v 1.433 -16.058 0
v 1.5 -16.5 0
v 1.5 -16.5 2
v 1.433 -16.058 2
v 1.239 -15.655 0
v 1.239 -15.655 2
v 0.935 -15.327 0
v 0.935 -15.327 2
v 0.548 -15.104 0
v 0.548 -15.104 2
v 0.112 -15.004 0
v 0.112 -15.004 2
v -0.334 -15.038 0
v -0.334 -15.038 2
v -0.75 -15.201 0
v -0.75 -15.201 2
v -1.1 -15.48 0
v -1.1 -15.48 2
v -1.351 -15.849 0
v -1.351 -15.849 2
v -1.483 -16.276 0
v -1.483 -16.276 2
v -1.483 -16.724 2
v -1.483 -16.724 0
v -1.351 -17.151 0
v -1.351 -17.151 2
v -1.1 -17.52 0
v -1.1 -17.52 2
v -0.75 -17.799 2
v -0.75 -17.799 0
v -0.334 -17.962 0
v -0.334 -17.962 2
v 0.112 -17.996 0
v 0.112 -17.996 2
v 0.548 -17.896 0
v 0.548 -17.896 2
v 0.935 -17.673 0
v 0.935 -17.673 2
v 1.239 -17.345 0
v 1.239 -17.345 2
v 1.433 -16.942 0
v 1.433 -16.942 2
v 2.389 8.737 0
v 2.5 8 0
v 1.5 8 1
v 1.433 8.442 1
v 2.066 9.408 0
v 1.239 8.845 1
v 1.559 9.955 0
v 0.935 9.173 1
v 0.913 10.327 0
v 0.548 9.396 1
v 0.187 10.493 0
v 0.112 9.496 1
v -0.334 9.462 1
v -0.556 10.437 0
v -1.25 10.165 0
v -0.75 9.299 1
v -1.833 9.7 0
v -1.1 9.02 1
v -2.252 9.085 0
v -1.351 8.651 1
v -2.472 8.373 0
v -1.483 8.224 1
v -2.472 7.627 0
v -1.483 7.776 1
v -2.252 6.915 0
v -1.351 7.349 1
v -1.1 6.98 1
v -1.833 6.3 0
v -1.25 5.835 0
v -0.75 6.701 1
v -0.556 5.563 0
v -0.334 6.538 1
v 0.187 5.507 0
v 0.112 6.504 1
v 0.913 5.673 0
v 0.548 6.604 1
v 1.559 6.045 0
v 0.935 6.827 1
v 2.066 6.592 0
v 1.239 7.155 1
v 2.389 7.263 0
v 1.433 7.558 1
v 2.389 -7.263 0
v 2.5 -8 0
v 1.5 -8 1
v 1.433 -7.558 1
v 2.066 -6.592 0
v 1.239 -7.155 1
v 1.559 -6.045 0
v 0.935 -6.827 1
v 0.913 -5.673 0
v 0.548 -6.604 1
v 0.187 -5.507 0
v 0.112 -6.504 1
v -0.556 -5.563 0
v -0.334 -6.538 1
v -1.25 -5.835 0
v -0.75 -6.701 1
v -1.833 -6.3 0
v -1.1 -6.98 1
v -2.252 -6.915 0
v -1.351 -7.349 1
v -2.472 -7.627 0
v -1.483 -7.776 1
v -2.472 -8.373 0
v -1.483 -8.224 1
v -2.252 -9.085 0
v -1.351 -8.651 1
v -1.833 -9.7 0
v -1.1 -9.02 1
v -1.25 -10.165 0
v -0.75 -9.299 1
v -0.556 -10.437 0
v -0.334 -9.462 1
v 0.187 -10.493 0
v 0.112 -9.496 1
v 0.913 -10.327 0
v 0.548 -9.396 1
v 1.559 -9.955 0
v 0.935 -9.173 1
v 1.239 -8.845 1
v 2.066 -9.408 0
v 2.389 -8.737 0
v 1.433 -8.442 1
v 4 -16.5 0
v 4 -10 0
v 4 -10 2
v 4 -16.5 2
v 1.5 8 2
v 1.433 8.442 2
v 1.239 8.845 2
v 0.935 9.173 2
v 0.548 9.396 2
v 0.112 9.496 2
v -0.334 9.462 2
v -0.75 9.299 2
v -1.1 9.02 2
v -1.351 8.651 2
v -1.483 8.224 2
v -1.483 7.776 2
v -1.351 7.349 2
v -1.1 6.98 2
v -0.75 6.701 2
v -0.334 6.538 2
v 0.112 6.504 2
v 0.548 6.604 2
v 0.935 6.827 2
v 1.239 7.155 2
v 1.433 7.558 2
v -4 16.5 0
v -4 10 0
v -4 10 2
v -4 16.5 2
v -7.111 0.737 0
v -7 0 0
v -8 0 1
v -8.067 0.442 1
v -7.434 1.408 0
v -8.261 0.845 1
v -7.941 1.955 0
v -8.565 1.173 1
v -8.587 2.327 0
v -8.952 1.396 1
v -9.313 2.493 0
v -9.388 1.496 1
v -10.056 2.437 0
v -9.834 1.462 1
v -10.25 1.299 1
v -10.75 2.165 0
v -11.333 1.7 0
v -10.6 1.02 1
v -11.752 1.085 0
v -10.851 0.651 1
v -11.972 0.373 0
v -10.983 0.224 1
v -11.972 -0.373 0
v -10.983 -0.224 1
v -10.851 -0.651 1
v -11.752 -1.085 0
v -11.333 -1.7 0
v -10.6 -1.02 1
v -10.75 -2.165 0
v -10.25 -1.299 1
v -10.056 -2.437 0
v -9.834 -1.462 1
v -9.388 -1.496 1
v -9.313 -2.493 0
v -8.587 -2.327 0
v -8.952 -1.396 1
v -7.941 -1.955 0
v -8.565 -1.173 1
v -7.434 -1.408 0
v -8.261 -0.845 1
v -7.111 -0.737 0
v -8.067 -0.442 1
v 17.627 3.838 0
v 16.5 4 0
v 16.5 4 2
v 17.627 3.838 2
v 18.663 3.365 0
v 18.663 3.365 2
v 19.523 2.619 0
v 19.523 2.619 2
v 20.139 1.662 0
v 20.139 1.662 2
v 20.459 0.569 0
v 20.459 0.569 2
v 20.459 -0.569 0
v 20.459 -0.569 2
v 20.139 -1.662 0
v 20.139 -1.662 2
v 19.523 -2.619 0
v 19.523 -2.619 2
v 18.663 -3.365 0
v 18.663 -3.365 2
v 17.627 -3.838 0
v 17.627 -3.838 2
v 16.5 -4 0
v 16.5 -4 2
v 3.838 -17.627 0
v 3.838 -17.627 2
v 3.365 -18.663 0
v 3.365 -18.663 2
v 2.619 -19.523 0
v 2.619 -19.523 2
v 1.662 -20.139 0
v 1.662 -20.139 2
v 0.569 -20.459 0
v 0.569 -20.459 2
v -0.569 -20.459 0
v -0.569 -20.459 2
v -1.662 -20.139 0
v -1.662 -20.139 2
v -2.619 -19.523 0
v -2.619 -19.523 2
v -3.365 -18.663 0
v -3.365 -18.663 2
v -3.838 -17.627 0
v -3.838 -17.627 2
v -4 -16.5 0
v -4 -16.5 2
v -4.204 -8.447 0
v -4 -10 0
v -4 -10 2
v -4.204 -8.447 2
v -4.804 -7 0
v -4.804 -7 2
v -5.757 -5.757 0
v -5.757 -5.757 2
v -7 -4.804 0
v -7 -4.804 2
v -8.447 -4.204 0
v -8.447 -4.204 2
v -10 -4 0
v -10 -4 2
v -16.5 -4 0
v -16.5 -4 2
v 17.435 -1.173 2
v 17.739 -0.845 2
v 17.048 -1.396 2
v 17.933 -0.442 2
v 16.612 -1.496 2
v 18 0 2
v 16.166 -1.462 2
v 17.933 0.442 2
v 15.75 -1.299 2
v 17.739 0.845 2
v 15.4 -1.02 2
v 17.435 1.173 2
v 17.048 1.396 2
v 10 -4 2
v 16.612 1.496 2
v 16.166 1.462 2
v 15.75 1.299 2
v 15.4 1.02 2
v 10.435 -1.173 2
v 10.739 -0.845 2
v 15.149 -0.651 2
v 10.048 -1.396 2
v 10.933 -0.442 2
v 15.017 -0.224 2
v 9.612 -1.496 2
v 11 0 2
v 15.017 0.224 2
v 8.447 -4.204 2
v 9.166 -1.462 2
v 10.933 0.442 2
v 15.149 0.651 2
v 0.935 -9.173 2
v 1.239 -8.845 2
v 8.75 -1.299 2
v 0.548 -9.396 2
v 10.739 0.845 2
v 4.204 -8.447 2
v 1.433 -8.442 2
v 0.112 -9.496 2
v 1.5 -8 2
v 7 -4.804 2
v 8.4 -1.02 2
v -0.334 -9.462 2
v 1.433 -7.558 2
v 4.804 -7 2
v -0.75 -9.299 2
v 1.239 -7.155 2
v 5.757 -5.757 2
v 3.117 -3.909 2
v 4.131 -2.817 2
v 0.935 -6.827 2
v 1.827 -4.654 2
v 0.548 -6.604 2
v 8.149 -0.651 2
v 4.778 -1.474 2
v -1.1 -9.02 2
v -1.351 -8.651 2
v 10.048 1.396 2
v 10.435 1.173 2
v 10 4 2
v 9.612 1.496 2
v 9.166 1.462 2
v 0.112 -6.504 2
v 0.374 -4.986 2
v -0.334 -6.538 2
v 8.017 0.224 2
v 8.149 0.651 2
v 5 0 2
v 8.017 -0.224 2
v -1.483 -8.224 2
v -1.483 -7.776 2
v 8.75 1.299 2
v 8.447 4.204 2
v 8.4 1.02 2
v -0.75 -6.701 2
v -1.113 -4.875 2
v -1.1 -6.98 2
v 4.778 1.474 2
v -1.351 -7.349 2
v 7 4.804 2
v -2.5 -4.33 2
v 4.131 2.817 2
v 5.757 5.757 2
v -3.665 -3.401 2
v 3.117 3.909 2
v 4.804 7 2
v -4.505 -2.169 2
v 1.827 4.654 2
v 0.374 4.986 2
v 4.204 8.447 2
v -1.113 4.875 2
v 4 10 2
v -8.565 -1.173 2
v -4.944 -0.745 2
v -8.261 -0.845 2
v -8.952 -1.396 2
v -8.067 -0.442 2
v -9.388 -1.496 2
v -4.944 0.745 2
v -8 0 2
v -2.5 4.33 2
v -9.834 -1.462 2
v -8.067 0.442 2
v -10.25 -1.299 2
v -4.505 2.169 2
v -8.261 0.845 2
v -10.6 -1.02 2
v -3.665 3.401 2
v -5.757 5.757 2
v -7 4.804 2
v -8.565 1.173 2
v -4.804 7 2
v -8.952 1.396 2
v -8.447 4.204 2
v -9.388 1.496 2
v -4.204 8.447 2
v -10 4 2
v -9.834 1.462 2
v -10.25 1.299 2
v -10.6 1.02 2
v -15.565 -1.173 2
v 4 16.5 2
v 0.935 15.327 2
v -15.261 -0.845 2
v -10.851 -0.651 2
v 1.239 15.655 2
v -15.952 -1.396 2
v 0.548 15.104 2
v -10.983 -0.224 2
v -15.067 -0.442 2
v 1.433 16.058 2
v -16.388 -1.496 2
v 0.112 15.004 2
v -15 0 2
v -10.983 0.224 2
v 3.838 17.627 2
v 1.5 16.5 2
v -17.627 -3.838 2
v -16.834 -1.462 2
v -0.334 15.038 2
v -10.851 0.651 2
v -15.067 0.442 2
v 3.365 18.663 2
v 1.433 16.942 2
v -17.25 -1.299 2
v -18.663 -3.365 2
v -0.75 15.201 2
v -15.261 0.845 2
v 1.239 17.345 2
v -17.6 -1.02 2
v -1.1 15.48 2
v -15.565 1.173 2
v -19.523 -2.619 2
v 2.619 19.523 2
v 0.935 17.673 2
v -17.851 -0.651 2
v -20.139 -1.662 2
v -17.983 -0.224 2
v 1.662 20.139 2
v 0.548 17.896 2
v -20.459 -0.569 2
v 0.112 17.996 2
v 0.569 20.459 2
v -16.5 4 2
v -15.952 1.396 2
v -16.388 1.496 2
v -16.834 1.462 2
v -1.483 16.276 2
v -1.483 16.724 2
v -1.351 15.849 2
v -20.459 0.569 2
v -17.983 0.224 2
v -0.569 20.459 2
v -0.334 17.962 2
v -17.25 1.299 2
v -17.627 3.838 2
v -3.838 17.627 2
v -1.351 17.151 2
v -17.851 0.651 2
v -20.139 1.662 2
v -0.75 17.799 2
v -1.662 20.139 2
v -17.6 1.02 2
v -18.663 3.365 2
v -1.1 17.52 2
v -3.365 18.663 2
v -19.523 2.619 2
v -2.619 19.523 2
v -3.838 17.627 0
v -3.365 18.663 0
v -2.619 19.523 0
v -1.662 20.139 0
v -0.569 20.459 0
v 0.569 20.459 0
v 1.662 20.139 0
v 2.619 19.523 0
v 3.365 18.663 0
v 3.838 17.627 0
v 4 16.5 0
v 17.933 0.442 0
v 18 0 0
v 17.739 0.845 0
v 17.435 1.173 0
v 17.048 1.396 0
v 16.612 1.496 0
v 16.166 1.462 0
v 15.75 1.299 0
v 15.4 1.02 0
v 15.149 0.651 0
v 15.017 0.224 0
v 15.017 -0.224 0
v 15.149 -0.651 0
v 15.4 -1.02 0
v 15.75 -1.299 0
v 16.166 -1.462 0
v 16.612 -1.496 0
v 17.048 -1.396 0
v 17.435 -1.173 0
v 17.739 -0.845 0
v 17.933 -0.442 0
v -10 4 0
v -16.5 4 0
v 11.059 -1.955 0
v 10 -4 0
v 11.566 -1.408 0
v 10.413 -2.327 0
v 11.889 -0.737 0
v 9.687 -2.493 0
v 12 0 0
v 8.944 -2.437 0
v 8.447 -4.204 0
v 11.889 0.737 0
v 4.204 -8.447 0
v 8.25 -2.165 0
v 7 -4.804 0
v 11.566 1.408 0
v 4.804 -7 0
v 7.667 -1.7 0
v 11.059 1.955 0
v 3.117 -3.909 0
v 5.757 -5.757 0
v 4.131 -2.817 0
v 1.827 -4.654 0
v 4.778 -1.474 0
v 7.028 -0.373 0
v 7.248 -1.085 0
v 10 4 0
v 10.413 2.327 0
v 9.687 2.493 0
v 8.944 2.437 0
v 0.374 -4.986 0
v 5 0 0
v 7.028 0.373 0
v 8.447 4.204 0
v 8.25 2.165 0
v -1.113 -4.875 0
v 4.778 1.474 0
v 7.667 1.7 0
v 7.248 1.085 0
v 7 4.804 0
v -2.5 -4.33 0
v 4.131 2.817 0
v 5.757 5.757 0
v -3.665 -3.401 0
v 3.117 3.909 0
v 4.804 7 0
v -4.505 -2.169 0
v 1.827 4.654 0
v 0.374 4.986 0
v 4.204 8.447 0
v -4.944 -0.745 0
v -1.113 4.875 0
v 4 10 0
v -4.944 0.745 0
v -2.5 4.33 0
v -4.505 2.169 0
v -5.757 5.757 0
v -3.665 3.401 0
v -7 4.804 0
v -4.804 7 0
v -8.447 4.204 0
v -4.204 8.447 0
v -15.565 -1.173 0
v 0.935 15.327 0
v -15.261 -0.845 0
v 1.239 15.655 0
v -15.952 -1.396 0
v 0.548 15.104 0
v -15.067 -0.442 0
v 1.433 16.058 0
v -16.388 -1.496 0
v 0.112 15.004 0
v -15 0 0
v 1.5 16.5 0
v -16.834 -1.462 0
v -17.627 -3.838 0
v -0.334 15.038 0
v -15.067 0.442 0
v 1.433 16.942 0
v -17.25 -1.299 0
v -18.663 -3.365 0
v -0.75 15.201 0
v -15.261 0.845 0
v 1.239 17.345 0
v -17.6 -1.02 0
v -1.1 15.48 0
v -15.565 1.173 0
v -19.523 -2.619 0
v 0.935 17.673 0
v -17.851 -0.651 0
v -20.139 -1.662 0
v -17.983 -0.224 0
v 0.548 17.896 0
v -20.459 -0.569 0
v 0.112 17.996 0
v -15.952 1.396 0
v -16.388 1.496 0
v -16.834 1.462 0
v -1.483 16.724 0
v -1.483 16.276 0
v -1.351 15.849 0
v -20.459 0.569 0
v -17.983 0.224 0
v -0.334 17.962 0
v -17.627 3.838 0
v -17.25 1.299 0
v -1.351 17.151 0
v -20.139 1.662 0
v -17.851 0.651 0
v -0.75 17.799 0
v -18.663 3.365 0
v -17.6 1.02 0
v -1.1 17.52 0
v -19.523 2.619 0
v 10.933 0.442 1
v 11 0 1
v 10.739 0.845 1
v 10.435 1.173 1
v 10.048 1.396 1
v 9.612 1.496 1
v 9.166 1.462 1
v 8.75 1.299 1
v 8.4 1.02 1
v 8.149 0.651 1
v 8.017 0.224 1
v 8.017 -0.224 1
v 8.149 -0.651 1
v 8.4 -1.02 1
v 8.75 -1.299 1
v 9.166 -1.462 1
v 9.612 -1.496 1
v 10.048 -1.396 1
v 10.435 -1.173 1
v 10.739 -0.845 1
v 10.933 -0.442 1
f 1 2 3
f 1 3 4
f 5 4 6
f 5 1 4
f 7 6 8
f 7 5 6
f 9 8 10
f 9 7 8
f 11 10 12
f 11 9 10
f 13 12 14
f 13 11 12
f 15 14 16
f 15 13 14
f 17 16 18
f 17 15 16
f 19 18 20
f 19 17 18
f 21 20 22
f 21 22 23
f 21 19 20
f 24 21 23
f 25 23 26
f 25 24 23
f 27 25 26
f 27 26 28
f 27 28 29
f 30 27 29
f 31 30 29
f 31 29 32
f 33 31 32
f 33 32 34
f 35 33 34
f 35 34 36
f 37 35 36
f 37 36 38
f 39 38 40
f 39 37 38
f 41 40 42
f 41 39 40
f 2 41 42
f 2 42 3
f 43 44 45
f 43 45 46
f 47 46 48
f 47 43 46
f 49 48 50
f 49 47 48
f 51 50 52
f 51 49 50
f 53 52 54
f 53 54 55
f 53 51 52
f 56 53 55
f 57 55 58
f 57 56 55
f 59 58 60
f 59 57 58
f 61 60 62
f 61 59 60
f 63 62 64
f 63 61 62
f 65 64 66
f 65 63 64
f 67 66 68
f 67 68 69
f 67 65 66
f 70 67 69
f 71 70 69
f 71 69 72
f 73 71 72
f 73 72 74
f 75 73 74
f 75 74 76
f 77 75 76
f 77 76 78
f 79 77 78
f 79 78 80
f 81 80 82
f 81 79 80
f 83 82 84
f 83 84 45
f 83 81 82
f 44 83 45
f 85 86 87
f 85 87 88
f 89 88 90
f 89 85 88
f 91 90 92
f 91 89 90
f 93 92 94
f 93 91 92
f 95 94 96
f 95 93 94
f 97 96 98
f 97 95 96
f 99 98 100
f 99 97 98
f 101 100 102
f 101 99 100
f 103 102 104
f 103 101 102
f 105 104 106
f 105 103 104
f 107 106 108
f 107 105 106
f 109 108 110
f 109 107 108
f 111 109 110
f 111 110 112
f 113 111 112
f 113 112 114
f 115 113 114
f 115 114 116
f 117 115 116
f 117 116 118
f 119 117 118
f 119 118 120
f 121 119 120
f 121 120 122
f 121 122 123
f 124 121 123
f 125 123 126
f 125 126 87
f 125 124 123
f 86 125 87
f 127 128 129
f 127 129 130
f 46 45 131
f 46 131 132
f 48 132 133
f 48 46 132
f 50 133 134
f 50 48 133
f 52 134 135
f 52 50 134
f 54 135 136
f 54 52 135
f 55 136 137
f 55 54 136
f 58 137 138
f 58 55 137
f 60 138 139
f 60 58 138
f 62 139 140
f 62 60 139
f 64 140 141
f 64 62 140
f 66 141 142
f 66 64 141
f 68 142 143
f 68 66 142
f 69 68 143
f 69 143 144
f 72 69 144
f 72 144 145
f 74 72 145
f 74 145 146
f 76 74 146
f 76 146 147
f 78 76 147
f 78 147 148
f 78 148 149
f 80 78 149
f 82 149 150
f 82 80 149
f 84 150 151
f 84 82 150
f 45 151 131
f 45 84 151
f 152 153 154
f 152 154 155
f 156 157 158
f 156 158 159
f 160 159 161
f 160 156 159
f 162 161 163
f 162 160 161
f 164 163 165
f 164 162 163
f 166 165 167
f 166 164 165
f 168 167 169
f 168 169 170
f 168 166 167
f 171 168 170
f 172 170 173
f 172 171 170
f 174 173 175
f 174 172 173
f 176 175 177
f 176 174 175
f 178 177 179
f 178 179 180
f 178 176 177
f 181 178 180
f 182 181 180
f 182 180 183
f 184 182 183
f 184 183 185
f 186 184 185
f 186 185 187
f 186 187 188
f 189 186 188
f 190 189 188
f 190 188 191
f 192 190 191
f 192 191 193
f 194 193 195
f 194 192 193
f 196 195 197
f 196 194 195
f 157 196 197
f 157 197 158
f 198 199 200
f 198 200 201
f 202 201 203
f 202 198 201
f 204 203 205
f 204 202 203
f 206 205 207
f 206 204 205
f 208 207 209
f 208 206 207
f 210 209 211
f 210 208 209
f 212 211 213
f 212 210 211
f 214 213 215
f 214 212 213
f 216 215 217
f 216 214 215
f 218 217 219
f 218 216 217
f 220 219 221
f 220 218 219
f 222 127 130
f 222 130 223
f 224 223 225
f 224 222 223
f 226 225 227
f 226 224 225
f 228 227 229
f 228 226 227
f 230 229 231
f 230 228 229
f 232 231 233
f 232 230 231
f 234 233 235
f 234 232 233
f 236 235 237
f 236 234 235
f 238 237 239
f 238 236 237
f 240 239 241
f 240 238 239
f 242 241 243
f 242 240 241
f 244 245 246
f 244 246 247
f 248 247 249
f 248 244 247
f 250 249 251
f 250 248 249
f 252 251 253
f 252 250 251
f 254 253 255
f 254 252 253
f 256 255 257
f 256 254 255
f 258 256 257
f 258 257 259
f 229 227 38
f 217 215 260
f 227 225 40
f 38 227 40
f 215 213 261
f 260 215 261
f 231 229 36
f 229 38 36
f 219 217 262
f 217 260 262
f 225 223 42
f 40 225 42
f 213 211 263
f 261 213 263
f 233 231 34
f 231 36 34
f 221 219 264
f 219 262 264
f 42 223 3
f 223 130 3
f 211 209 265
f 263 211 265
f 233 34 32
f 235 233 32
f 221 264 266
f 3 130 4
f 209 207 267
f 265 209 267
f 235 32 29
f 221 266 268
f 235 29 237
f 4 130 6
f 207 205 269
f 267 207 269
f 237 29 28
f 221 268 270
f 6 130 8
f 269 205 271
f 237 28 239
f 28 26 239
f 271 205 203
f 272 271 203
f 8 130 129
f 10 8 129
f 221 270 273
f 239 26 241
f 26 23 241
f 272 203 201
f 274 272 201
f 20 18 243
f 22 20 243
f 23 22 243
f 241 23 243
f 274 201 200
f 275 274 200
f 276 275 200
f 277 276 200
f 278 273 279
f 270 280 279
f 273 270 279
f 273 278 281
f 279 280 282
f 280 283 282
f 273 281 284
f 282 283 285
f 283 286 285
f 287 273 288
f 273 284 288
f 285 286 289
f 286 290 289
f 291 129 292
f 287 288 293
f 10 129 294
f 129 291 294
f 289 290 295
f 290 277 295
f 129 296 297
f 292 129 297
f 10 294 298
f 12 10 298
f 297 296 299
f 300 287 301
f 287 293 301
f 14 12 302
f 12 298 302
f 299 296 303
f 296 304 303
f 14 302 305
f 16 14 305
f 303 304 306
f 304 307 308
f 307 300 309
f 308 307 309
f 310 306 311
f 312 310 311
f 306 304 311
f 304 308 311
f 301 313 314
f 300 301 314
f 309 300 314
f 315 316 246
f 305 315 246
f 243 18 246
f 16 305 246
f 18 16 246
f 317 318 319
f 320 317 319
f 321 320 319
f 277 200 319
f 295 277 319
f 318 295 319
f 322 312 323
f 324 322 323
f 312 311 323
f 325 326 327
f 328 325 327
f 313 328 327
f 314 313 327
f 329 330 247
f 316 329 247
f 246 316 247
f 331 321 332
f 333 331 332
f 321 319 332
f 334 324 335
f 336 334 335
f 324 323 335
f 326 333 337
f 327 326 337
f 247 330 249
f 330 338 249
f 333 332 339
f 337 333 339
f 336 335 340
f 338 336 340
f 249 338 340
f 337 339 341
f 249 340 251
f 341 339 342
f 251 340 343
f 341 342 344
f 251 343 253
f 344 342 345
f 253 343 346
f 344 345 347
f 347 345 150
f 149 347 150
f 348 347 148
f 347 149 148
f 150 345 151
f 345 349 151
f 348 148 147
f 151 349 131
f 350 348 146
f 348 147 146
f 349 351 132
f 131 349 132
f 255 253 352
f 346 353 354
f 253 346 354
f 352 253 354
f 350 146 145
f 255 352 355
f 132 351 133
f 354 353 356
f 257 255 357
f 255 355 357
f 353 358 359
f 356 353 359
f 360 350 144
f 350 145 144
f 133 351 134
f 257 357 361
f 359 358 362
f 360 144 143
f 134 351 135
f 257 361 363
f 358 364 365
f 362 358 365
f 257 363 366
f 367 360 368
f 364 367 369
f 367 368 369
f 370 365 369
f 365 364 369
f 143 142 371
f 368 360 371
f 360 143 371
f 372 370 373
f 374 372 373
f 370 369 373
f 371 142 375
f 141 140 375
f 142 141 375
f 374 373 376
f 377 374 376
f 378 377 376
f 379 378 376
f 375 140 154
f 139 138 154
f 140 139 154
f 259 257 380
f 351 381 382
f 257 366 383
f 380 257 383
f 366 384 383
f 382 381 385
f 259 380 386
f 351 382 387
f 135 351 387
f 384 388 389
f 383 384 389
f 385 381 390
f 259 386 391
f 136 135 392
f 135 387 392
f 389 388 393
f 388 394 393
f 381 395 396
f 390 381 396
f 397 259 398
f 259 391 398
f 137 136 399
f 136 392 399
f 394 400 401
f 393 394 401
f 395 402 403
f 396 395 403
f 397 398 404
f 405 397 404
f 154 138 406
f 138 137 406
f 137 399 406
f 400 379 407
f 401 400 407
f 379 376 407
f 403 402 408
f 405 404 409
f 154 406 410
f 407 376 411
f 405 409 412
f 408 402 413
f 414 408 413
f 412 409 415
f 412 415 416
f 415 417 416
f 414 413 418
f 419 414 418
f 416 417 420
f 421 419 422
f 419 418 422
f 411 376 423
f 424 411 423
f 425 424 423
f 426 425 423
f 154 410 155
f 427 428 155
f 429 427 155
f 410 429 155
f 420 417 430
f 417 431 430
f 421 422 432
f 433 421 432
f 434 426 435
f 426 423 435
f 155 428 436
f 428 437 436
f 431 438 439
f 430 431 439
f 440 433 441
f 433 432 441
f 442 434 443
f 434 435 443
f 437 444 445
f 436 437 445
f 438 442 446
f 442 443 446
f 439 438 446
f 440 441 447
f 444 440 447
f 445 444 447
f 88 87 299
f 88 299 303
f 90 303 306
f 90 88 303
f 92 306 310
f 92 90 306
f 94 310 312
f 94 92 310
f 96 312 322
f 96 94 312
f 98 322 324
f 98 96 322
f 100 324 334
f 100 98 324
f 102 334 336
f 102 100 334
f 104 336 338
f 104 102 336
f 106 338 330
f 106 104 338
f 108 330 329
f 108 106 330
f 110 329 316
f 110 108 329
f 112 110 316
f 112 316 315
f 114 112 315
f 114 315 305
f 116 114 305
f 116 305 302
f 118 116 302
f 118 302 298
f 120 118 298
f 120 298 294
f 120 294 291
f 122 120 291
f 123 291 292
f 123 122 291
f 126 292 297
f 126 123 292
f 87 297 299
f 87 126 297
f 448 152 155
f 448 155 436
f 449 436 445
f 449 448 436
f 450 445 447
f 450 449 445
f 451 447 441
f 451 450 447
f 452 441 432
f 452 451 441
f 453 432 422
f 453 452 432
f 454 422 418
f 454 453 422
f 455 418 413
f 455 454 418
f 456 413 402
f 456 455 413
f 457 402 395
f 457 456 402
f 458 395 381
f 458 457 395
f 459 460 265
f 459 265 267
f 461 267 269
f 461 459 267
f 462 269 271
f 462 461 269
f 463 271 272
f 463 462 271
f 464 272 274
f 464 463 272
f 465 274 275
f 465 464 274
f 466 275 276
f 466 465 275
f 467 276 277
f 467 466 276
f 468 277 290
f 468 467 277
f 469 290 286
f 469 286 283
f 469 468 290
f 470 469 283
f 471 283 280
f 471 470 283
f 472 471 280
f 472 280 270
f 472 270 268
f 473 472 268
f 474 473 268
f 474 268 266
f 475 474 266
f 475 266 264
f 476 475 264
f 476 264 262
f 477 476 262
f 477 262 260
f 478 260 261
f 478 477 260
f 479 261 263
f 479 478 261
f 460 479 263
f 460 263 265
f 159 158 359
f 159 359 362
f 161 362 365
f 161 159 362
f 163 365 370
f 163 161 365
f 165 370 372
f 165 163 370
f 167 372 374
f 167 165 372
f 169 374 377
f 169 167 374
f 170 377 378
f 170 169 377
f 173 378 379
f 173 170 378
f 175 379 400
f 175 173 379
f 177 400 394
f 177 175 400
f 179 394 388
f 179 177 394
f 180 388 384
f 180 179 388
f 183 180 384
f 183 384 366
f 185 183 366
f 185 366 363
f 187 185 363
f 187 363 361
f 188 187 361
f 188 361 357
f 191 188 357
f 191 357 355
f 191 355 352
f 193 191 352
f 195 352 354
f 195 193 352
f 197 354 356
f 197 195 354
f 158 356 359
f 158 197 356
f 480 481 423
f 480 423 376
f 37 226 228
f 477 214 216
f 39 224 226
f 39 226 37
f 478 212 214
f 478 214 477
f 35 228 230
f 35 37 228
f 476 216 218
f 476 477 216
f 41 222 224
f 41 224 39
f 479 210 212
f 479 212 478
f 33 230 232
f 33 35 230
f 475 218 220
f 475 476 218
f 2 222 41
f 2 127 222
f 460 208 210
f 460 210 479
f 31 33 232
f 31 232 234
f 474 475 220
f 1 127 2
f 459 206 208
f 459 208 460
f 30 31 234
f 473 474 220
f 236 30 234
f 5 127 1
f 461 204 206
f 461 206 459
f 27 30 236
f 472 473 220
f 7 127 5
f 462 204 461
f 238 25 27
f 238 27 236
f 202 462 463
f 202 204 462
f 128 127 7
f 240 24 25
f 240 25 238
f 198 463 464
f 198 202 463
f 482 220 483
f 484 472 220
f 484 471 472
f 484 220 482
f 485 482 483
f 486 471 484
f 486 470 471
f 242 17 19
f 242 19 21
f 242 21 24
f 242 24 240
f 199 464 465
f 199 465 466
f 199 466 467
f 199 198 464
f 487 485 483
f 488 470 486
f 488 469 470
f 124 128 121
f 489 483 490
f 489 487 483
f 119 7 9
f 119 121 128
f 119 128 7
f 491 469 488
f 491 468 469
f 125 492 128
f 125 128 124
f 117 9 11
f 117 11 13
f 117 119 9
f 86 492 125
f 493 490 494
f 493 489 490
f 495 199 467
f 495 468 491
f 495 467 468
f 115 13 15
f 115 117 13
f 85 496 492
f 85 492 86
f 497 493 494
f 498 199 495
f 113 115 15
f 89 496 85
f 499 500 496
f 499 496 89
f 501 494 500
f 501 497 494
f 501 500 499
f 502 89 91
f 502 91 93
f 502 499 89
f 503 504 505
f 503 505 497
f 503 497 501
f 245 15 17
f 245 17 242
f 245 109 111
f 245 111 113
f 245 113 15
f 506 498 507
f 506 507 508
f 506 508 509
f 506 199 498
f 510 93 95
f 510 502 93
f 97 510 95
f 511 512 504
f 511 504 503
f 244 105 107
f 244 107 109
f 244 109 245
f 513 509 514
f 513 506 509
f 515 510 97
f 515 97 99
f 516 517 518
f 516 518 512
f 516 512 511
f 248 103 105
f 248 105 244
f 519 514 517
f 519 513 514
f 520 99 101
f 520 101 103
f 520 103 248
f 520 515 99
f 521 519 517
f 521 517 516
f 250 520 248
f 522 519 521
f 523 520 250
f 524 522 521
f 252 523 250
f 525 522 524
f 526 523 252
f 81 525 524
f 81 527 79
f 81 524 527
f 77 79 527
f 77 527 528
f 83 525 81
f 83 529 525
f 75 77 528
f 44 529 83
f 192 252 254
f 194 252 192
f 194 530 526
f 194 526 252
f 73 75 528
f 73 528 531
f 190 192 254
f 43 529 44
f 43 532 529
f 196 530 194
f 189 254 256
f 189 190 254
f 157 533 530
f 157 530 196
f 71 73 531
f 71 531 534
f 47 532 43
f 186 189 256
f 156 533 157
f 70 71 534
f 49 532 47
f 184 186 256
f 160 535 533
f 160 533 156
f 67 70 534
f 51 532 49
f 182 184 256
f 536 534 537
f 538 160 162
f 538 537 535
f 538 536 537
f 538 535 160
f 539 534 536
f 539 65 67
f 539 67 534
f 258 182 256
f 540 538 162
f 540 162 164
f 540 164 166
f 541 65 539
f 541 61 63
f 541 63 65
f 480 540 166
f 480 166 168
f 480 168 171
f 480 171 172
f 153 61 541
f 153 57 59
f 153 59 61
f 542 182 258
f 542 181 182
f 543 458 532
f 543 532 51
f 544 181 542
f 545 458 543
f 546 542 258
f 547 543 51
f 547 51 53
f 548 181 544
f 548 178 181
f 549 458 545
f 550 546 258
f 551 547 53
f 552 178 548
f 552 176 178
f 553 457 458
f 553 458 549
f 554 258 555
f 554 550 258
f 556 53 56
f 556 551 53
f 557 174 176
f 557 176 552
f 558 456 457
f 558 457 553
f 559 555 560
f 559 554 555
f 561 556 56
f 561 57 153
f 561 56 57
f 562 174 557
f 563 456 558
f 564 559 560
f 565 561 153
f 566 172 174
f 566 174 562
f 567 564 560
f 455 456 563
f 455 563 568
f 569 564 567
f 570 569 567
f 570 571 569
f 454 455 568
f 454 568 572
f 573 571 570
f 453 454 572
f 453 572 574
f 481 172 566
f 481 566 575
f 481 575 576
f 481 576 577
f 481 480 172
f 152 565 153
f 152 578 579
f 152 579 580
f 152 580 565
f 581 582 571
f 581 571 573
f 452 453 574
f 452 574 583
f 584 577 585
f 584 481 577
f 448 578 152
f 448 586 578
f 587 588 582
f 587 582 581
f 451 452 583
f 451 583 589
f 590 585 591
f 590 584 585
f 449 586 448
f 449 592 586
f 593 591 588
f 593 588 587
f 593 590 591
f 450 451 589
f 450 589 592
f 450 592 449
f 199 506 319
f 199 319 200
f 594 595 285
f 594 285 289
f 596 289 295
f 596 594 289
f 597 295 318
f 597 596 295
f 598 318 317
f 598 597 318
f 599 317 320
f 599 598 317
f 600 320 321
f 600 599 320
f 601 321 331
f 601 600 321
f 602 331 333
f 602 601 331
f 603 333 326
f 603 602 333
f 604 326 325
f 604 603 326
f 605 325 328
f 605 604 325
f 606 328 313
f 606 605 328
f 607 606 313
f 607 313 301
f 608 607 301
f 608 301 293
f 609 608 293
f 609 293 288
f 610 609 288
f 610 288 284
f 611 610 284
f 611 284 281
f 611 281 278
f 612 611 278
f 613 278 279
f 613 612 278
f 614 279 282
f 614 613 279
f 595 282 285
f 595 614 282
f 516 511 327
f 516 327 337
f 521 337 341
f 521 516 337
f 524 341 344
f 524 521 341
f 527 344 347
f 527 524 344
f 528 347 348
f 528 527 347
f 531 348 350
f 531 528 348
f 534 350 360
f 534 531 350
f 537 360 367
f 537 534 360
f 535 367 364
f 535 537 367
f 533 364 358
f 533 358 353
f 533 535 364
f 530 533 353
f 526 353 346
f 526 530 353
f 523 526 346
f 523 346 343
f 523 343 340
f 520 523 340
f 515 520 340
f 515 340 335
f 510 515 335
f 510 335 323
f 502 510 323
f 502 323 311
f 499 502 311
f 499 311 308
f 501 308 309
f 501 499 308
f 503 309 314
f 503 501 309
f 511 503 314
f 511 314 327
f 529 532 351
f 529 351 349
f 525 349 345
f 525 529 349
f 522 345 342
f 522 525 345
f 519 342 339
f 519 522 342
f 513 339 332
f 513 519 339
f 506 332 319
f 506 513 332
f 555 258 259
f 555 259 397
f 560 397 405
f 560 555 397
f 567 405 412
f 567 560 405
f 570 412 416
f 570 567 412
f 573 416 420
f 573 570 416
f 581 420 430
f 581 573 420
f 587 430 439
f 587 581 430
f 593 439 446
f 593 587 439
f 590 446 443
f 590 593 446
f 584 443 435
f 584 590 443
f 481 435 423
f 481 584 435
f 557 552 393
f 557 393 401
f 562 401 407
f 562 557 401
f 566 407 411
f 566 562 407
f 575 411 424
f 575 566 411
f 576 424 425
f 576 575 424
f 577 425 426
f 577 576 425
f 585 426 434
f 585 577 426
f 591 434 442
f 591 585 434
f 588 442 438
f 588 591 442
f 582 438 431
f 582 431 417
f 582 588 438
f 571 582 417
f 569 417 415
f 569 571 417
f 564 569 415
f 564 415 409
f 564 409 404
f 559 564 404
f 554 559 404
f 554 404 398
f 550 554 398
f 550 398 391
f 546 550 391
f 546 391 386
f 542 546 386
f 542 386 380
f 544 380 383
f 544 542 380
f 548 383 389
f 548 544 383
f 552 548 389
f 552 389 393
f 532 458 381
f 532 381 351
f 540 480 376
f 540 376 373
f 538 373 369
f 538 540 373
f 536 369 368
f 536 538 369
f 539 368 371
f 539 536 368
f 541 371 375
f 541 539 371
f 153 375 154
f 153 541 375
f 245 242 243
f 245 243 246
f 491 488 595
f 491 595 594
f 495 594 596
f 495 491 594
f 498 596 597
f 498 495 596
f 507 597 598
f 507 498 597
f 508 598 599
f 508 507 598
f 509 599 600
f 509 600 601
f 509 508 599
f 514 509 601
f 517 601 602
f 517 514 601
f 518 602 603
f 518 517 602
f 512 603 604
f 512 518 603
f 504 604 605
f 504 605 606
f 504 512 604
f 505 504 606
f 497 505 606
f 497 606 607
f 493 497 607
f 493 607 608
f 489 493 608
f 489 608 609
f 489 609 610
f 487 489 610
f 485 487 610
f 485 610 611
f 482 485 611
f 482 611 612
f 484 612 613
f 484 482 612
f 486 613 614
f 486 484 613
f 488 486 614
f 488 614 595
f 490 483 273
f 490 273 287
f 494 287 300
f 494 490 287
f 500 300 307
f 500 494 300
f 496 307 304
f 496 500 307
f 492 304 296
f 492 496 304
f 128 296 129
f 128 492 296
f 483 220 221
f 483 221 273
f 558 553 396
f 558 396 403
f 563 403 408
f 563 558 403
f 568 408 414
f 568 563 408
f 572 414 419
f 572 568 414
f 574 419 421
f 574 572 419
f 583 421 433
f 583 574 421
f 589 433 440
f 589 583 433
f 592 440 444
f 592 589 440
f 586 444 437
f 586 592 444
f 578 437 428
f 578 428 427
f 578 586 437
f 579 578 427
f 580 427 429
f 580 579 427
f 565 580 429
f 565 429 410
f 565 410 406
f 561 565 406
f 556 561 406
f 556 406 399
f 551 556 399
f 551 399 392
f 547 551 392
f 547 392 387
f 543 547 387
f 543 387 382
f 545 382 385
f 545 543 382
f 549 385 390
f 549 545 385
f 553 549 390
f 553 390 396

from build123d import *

# Parameters (mm, degrees)
IZIM1_R                     = 1.5
IZIM1_R_2                   = 5
Y_KSEKLIK_EKSTR_ZYON1_DEPTH = 2
CHAMFER_1_SIZE              = 1


with BuildPart() as part:
    # Çizim1 → Yükseklik-Ekstrüzyon1 (new body)
    with BuildSketch(Plane.XY):
        with BuildLine():
            Line((10, 4), (16.5, 4))
            ThreePointArc((16.5, 4), (20.500000347, 3.47e-07), (16.500000694, -4))
            Line((16.500000694, -4), (10.000000694, -4))
            ThreePointArc((10.000000694, -4), (5.757359762, -5.757359558), (4.000000694, -10.000000694))
            Line((4.000000694, -10.000000694), (4.000000694, -16.500000694))
            ThreePointArc((4.000000694, -16.500000694), (6.94e-07, -20.500000694), (-3.999999306, -16.500000694))
            Line((-3.999999306, -16.500000694), (-3.999999306, -10.000000694))
            ThreePointArc((-3.999999306, -10.000000694), (-5.757358864, -5.757359762), (-10, -4.000000694))
            Line((-10, -4.000000694), (-16.5, -4.000000694))
            ThreePointArc((-16.5, -4.000000694), (-20.5, -6.94e-07), (-16.5, 3.999999306))
            Line((-16.5, 3.999999306), (-10, 3.999999306))
            ThreePointArc((-10, 3.999999306), (-5.757359067, 5.757358864), (-4, 10))
            Line((-4, 10), (-4, 16.5))
            ThreePointArc((-4, 16.5), (0, 20.5), (4, 16.5))
            Line((4, 16.5), (4, 10))
            ThreePointArc((4, 10), (5.757359313, 5.757359313), (10, 4))
        make_face()
        with Locations((0, 8)):
            Circle(IZIM1_R, mode=Mode.SUBTRACT)
        with Locations((16.500000347, 0)):
            Circle(IZIM1_R, mode=Mode.SUBTRACT)
        with Locations((9.5, -6.94e-07)):
            Circle(IZIM1_R, mode=Mode.SUBTRACT)
        with Locations((0, 16.5)):
            Circle(IZIM1_R, mode=Mode.SUBTRACT)
        with Locations((6.94e-07, -16.500000694)):
            Circle(IZIM1_R, mode=Mode.SUBTRACT)
        with Locations((6.94e-07, -8.000000694)):
            Circle(IZIM1_R, mode=Mode.SUBTRACT)
        Circle(IZIM1_R_2, mode=Mode.SUBTRACT)
        with Locations((-16.5, -6.94e-07)):
            Circle(IZIM1_R, mode=Mode.SUBTRACT)
        with Locations((-9.5, -6.94e-07)):
            Circle(IZIM1_R, mode=Mode.SUBTRACT)
    extrude(amount=Y_KSEKLIK_EKSTR_ZYON1_DEPTH)

    # Фаска1
    chamfer_1_edges = [part.edges().sort_by_distance(p)[0] for p in [
        (-1.5, 8, 0),
        (8, -6.94e-07, 0),
        (-1.499999306, -8.000000694, 0),
        (-11, -6.94e-07, 0),
    ]]
    chamfer(chamfer_1_edges, length=CHAMFER_1_SIZE)


solid = part.part
